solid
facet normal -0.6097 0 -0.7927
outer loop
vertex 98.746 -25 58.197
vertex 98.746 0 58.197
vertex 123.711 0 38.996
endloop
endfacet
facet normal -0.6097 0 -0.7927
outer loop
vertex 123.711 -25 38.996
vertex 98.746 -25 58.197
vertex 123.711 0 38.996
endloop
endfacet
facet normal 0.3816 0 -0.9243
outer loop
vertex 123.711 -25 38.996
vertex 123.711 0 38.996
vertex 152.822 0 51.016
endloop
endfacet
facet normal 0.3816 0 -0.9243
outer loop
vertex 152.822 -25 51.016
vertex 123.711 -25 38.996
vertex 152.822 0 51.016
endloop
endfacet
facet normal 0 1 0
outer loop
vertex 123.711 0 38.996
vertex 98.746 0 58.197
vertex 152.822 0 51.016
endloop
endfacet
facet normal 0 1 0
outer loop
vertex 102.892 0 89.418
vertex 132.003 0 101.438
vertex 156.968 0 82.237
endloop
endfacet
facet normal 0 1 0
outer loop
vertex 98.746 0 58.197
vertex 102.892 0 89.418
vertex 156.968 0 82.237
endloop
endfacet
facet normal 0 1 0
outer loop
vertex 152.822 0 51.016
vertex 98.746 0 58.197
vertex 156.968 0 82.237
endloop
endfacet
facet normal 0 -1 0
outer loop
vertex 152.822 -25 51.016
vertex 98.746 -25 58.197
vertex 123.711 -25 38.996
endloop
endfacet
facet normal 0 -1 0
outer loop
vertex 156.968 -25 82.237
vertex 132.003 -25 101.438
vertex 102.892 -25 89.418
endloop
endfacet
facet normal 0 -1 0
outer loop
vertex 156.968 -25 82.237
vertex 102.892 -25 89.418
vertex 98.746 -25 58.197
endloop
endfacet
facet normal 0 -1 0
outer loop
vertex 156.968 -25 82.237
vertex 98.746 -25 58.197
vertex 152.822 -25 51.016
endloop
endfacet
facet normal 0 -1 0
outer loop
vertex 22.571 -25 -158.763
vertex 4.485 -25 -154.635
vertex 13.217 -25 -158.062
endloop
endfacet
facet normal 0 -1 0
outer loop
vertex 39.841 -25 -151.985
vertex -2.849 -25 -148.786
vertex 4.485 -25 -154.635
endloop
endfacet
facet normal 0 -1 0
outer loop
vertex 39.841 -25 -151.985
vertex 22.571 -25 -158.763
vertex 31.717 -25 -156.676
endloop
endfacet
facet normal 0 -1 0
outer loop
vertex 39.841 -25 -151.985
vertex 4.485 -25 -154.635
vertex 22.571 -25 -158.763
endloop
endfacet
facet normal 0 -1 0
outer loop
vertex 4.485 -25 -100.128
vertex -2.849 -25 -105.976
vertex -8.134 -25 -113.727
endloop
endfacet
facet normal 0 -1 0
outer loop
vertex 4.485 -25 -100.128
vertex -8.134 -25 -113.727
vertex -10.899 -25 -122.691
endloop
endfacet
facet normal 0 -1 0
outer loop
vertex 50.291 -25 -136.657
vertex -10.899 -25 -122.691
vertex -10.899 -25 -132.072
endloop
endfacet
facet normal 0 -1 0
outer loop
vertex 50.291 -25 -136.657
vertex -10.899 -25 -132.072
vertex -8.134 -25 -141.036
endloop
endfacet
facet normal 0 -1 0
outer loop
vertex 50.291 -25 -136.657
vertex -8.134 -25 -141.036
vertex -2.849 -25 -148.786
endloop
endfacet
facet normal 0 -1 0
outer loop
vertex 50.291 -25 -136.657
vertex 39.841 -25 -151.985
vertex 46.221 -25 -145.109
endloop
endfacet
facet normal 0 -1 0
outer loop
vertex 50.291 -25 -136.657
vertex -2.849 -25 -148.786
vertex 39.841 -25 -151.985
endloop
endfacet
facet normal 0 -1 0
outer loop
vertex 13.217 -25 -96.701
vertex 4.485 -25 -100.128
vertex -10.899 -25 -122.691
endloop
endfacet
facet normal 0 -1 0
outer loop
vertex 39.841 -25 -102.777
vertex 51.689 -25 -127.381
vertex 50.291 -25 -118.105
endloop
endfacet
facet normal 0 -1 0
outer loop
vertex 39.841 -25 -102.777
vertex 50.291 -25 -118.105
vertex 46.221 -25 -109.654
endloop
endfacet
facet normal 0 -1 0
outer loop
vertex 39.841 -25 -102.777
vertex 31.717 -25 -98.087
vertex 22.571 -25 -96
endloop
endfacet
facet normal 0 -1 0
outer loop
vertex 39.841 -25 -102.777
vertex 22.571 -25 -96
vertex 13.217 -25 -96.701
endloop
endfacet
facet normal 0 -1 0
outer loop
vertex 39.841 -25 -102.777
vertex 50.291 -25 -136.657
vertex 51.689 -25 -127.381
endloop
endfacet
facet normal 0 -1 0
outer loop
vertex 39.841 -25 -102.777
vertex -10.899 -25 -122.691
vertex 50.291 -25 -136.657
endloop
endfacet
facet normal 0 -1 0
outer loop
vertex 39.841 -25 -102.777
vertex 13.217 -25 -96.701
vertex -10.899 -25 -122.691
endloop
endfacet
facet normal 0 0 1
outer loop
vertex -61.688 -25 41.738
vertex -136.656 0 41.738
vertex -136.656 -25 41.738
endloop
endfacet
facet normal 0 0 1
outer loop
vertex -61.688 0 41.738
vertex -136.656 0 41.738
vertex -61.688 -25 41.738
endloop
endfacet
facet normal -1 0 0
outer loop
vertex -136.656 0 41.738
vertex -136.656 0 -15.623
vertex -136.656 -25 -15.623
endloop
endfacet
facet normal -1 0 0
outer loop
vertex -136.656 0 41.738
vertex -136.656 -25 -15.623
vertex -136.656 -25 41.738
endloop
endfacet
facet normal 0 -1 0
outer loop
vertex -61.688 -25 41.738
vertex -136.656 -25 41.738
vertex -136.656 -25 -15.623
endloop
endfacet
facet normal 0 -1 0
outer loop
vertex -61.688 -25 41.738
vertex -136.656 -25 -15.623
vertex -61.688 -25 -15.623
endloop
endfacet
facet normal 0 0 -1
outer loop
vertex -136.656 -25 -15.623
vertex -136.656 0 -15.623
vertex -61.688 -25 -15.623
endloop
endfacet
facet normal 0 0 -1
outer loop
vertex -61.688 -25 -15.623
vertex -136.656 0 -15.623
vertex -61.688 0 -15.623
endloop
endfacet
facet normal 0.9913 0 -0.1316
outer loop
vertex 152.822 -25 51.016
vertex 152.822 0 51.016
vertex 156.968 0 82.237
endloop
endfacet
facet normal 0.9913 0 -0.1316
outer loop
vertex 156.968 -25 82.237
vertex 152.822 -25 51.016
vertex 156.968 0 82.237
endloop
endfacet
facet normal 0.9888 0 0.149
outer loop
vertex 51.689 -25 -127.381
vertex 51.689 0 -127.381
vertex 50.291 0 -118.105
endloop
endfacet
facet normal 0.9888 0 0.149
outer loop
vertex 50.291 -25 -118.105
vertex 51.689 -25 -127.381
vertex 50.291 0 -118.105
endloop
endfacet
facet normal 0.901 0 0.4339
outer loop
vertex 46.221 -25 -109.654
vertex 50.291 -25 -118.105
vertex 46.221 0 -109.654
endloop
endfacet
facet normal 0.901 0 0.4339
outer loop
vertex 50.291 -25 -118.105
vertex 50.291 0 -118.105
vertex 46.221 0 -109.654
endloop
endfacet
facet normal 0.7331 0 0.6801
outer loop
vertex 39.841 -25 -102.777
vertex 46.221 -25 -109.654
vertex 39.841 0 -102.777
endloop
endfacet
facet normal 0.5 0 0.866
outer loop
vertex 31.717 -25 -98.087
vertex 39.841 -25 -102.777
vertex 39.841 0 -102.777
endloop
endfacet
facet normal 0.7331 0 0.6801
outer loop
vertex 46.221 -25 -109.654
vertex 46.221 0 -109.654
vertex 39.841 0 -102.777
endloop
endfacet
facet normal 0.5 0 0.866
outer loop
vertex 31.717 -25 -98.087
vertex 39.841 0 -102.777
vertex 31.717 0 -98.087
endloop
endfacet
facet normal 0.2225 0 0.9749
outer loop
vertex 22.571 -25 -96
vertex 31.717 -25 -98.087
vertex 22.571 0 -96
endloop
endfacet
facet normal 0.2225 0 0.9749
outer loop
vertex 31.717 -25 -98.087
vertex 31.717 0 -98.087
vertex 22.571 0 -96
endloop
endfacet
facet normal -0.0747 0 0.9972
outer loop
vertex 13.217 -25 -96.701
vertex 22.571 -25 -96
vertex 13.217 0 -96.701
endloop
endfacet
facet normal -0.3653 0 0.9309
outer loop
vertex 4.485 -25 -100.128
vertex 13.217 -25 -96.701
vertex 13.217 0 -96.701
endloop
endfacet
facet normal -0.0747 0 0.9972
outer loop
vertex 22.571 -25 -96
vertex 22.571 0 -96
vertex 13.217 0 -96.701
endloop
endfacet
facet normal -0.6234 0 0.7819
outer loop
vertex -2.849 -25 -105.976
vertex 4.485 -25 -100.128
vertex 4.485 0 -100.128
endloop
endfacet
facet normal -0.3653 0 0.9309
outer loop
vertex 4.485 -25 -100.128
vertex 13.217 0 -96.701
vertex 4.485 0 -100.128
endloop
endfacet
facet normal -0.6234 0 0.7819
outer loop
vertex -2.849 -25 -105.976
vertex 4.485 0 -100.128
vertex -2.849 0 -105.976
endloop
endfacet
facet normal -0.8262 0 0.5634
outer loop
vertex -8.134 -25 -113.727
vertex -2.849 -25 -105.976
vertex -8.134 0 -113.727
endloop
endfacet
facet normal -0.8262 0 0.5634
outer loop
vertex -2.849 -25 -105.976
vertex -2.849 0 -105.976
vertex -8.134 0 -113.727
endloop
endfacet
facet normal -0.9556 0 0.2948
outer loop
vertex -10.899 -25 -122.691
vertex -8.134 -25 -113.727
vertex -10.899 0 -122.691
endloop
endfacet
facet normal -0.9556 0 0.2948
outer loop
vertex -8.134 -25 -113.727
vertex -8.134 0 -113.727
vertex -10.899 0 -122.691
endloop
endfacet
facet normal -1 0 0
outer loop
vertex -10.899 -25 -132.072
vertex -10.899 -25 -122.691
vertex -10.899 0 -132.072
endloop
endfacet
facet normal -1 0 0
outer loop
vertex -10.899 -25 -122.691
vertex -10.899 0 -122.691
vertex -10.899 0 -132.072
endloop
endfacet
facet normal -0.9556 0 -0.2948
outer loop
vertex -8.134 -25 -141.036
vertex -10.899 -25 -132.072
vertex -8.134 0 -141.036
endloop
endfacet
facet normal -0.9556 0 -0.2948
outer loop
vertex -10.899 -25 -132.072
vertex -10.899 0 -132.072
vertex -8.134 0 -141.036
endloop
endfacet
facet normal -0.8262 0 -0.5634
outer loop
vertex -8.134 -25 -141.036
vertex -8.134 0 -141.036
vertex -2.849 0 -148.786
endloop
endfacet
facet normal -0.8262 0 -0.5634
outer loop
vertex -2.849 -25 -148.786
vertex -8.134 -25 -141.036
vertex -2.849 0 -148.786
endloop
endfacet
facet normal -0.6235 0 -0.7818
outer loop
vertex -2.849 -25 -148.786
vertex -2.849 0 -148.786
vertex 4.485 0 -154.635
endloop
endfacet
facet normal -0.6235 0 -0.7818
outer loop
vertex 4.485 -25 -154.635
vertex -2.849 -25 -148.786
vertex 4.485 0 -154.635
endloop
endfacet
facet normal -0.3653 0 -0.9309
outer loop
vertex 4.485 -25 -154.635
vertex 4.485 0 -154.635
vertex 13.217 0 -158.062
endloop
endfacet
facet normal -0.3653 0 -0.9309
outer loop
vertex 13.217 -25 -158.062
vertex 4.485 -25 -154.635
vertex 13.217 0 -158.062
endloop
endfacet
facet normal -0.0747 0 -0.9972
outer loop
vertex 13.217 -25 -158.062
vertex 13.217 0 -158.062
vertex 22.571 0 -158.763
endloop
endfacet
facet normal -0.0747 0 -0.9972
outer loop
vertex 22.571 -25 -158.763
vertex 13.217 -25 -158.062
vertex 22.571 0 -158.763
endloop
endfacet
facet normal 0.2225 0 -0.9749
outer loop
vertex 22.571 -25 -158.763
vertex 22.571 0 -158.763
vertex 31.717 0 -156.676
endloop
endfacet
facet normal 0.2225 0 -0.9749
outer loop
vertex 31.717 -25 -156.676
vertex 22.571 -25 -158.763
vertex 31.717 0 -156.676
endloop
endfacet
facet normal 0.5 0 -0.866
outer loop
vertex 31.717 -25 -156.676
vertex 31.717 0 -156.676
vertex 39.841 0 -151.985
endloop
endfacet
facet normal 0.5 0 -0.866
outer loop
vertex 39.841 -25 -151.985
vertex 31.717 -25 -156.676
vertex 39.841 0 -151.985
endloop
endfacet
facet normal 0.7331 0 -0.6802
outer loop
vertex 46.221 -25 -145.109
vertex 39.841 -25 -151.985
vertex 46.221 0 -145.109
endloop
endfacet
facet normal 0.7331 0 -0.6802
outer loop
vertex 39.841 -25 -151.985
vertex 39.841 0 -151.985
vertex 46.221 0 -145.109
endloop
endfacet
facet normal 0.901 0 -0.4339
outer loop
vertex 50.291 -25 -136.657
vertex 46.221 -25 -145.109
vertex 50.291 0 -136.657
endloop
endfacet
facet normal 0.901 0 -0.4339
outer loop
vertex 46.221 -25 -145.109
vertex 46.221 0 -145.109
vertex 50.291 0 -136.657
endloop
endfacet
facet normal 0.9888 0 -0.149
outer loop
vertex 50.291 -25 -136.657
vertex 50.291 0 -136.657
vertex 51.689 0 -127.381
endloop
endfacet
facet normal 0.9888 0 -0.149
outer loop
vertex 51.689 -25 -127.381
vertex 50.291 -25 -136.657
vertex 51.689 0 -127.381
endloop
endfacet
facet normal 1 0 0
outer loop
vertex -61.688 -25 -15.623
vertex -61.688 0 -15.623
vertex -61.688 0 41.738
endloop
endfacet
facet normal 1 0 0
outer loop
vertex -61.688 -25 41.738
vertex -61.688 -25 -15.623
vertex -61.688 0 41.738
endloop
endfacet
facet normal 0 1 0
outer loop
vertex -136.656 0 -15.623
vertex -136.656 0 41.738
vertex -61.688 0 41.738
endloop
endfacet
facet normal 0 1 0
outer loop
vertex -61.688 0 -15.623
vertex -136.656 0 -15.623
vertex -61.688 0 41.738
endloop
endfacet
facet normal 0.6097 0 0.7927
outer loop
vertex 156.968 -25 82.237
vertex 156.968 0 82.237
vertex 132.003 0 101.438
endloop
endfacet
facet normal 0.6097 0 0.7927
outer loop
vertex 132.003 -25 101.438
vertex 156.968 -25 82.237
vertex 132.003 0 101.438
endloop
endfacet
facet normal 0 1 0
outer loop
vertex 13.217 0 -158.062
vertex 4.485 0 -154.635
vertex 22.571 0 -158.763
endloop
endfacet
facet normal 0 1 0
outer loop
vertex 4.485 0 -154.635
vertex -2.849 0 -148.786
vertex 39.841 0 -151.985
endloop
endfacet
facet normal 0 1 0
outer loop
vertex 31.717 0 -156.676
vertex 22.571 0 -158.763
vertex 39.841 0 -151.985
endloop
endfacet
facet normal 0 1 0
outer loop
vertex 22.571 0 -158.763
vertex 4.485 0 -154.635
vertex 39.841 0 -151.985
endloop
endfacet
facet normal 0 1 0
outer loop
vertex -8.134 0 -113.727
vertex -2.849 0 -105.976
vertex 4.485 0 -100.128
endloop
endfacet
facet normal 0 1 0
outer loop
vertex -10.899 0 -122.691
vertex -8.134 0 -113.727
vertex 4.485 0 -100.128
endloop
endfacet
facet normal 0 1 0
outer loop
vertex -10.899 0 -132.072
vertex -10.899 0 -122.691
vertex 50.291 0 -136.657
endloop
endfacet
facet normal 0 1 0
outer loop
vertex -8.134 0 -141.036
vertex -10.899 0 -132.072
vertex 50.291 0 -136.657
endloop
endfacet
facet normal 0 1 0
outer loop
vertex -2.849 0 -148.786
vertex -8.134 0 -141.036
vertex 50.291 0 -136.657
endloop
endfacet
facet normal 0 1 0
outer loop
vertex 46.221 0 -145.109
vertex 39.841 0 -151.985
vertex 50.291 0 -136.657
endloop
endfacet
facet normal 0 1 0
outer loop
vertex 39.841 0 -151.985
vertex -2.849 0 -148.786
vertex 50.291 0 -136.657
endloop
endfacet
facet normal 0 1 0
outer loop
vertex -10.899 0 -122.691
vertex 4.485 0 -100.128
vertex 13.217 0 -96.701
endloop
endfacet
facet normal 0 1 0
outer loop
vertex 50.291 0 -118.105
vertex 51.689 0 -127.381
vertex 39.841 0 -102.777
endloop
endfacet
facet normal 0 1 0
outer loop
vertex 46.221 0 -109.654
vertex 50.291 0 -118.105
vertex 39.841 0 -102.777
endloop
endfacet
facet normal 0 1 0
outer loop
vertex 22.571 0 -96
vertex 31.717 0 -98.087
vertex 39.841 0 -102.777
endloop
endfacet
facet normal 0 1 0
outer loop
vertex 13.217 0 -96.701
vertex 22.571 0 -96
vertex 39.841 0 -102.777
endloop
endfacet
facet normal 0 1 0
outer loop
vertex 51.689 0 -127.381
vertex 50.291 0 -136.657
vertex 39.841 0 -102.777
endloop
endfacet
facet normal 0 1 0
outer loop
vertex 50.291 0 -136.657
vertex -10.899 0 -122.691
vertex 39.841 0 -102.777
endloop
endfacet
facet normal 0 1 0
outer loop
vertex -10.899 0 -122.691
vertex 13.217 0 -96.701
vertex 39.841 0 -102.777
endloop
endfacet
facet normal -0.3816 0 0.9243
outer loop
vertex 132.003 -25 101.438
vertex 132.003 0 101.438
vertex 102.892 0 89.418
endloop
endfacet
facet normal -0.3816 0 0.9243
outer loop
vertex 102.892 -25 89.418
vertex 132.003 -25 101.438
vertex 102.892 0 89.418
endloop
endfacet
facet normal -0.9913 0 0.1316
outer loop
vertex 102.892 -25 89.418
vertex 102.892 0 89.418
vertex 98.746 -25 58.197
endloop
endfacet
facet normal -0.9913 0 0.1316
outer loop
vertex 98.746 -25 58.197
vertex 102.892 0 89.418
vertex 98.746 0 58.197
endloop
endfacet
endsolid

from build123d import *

# Parameters (mm, degrees)
F0_W     = 74.967474
F0_H     = 57.360351
F1_DEPTH = 25
F2_R     = 31.469794
F3_DEPTH = 25
F5_DEPTH = 25


with BuildPart() as f1:
    # F0 (on Front) → F1 (new body)
    with BuildSketch(Plane.XZ):
        with Locations((-99.17222, 13.057399)):
            Rectangle(F0_W, F0_H)
    extrude(amount=F1_DEPTH)


with BuildPart() as f3:
    # F2 (on Front) → F3 (new body)
    with BuildSketch(Plane.XZ):
        with Locations((20.219697, -127.381384)):
            Circle(F2_R)
    extrude(amount=F3_DEPTH)


with BuildPart() as f5:
    # F4 (on Front) → F5 (new body)
    with BuildSketch(Plane.XZ):
        Polygon((132.003457, 101.437553), (102.892398, 89.417727), (98.746343, 58.196897), (123.711347, 38.995893), (152.822406, 51.015719), (156.968461, 82.236548), align=None)
    extrude(amount=F5_DEPTH)


solid = Compound([f1.part, f3.part, f5.part])
